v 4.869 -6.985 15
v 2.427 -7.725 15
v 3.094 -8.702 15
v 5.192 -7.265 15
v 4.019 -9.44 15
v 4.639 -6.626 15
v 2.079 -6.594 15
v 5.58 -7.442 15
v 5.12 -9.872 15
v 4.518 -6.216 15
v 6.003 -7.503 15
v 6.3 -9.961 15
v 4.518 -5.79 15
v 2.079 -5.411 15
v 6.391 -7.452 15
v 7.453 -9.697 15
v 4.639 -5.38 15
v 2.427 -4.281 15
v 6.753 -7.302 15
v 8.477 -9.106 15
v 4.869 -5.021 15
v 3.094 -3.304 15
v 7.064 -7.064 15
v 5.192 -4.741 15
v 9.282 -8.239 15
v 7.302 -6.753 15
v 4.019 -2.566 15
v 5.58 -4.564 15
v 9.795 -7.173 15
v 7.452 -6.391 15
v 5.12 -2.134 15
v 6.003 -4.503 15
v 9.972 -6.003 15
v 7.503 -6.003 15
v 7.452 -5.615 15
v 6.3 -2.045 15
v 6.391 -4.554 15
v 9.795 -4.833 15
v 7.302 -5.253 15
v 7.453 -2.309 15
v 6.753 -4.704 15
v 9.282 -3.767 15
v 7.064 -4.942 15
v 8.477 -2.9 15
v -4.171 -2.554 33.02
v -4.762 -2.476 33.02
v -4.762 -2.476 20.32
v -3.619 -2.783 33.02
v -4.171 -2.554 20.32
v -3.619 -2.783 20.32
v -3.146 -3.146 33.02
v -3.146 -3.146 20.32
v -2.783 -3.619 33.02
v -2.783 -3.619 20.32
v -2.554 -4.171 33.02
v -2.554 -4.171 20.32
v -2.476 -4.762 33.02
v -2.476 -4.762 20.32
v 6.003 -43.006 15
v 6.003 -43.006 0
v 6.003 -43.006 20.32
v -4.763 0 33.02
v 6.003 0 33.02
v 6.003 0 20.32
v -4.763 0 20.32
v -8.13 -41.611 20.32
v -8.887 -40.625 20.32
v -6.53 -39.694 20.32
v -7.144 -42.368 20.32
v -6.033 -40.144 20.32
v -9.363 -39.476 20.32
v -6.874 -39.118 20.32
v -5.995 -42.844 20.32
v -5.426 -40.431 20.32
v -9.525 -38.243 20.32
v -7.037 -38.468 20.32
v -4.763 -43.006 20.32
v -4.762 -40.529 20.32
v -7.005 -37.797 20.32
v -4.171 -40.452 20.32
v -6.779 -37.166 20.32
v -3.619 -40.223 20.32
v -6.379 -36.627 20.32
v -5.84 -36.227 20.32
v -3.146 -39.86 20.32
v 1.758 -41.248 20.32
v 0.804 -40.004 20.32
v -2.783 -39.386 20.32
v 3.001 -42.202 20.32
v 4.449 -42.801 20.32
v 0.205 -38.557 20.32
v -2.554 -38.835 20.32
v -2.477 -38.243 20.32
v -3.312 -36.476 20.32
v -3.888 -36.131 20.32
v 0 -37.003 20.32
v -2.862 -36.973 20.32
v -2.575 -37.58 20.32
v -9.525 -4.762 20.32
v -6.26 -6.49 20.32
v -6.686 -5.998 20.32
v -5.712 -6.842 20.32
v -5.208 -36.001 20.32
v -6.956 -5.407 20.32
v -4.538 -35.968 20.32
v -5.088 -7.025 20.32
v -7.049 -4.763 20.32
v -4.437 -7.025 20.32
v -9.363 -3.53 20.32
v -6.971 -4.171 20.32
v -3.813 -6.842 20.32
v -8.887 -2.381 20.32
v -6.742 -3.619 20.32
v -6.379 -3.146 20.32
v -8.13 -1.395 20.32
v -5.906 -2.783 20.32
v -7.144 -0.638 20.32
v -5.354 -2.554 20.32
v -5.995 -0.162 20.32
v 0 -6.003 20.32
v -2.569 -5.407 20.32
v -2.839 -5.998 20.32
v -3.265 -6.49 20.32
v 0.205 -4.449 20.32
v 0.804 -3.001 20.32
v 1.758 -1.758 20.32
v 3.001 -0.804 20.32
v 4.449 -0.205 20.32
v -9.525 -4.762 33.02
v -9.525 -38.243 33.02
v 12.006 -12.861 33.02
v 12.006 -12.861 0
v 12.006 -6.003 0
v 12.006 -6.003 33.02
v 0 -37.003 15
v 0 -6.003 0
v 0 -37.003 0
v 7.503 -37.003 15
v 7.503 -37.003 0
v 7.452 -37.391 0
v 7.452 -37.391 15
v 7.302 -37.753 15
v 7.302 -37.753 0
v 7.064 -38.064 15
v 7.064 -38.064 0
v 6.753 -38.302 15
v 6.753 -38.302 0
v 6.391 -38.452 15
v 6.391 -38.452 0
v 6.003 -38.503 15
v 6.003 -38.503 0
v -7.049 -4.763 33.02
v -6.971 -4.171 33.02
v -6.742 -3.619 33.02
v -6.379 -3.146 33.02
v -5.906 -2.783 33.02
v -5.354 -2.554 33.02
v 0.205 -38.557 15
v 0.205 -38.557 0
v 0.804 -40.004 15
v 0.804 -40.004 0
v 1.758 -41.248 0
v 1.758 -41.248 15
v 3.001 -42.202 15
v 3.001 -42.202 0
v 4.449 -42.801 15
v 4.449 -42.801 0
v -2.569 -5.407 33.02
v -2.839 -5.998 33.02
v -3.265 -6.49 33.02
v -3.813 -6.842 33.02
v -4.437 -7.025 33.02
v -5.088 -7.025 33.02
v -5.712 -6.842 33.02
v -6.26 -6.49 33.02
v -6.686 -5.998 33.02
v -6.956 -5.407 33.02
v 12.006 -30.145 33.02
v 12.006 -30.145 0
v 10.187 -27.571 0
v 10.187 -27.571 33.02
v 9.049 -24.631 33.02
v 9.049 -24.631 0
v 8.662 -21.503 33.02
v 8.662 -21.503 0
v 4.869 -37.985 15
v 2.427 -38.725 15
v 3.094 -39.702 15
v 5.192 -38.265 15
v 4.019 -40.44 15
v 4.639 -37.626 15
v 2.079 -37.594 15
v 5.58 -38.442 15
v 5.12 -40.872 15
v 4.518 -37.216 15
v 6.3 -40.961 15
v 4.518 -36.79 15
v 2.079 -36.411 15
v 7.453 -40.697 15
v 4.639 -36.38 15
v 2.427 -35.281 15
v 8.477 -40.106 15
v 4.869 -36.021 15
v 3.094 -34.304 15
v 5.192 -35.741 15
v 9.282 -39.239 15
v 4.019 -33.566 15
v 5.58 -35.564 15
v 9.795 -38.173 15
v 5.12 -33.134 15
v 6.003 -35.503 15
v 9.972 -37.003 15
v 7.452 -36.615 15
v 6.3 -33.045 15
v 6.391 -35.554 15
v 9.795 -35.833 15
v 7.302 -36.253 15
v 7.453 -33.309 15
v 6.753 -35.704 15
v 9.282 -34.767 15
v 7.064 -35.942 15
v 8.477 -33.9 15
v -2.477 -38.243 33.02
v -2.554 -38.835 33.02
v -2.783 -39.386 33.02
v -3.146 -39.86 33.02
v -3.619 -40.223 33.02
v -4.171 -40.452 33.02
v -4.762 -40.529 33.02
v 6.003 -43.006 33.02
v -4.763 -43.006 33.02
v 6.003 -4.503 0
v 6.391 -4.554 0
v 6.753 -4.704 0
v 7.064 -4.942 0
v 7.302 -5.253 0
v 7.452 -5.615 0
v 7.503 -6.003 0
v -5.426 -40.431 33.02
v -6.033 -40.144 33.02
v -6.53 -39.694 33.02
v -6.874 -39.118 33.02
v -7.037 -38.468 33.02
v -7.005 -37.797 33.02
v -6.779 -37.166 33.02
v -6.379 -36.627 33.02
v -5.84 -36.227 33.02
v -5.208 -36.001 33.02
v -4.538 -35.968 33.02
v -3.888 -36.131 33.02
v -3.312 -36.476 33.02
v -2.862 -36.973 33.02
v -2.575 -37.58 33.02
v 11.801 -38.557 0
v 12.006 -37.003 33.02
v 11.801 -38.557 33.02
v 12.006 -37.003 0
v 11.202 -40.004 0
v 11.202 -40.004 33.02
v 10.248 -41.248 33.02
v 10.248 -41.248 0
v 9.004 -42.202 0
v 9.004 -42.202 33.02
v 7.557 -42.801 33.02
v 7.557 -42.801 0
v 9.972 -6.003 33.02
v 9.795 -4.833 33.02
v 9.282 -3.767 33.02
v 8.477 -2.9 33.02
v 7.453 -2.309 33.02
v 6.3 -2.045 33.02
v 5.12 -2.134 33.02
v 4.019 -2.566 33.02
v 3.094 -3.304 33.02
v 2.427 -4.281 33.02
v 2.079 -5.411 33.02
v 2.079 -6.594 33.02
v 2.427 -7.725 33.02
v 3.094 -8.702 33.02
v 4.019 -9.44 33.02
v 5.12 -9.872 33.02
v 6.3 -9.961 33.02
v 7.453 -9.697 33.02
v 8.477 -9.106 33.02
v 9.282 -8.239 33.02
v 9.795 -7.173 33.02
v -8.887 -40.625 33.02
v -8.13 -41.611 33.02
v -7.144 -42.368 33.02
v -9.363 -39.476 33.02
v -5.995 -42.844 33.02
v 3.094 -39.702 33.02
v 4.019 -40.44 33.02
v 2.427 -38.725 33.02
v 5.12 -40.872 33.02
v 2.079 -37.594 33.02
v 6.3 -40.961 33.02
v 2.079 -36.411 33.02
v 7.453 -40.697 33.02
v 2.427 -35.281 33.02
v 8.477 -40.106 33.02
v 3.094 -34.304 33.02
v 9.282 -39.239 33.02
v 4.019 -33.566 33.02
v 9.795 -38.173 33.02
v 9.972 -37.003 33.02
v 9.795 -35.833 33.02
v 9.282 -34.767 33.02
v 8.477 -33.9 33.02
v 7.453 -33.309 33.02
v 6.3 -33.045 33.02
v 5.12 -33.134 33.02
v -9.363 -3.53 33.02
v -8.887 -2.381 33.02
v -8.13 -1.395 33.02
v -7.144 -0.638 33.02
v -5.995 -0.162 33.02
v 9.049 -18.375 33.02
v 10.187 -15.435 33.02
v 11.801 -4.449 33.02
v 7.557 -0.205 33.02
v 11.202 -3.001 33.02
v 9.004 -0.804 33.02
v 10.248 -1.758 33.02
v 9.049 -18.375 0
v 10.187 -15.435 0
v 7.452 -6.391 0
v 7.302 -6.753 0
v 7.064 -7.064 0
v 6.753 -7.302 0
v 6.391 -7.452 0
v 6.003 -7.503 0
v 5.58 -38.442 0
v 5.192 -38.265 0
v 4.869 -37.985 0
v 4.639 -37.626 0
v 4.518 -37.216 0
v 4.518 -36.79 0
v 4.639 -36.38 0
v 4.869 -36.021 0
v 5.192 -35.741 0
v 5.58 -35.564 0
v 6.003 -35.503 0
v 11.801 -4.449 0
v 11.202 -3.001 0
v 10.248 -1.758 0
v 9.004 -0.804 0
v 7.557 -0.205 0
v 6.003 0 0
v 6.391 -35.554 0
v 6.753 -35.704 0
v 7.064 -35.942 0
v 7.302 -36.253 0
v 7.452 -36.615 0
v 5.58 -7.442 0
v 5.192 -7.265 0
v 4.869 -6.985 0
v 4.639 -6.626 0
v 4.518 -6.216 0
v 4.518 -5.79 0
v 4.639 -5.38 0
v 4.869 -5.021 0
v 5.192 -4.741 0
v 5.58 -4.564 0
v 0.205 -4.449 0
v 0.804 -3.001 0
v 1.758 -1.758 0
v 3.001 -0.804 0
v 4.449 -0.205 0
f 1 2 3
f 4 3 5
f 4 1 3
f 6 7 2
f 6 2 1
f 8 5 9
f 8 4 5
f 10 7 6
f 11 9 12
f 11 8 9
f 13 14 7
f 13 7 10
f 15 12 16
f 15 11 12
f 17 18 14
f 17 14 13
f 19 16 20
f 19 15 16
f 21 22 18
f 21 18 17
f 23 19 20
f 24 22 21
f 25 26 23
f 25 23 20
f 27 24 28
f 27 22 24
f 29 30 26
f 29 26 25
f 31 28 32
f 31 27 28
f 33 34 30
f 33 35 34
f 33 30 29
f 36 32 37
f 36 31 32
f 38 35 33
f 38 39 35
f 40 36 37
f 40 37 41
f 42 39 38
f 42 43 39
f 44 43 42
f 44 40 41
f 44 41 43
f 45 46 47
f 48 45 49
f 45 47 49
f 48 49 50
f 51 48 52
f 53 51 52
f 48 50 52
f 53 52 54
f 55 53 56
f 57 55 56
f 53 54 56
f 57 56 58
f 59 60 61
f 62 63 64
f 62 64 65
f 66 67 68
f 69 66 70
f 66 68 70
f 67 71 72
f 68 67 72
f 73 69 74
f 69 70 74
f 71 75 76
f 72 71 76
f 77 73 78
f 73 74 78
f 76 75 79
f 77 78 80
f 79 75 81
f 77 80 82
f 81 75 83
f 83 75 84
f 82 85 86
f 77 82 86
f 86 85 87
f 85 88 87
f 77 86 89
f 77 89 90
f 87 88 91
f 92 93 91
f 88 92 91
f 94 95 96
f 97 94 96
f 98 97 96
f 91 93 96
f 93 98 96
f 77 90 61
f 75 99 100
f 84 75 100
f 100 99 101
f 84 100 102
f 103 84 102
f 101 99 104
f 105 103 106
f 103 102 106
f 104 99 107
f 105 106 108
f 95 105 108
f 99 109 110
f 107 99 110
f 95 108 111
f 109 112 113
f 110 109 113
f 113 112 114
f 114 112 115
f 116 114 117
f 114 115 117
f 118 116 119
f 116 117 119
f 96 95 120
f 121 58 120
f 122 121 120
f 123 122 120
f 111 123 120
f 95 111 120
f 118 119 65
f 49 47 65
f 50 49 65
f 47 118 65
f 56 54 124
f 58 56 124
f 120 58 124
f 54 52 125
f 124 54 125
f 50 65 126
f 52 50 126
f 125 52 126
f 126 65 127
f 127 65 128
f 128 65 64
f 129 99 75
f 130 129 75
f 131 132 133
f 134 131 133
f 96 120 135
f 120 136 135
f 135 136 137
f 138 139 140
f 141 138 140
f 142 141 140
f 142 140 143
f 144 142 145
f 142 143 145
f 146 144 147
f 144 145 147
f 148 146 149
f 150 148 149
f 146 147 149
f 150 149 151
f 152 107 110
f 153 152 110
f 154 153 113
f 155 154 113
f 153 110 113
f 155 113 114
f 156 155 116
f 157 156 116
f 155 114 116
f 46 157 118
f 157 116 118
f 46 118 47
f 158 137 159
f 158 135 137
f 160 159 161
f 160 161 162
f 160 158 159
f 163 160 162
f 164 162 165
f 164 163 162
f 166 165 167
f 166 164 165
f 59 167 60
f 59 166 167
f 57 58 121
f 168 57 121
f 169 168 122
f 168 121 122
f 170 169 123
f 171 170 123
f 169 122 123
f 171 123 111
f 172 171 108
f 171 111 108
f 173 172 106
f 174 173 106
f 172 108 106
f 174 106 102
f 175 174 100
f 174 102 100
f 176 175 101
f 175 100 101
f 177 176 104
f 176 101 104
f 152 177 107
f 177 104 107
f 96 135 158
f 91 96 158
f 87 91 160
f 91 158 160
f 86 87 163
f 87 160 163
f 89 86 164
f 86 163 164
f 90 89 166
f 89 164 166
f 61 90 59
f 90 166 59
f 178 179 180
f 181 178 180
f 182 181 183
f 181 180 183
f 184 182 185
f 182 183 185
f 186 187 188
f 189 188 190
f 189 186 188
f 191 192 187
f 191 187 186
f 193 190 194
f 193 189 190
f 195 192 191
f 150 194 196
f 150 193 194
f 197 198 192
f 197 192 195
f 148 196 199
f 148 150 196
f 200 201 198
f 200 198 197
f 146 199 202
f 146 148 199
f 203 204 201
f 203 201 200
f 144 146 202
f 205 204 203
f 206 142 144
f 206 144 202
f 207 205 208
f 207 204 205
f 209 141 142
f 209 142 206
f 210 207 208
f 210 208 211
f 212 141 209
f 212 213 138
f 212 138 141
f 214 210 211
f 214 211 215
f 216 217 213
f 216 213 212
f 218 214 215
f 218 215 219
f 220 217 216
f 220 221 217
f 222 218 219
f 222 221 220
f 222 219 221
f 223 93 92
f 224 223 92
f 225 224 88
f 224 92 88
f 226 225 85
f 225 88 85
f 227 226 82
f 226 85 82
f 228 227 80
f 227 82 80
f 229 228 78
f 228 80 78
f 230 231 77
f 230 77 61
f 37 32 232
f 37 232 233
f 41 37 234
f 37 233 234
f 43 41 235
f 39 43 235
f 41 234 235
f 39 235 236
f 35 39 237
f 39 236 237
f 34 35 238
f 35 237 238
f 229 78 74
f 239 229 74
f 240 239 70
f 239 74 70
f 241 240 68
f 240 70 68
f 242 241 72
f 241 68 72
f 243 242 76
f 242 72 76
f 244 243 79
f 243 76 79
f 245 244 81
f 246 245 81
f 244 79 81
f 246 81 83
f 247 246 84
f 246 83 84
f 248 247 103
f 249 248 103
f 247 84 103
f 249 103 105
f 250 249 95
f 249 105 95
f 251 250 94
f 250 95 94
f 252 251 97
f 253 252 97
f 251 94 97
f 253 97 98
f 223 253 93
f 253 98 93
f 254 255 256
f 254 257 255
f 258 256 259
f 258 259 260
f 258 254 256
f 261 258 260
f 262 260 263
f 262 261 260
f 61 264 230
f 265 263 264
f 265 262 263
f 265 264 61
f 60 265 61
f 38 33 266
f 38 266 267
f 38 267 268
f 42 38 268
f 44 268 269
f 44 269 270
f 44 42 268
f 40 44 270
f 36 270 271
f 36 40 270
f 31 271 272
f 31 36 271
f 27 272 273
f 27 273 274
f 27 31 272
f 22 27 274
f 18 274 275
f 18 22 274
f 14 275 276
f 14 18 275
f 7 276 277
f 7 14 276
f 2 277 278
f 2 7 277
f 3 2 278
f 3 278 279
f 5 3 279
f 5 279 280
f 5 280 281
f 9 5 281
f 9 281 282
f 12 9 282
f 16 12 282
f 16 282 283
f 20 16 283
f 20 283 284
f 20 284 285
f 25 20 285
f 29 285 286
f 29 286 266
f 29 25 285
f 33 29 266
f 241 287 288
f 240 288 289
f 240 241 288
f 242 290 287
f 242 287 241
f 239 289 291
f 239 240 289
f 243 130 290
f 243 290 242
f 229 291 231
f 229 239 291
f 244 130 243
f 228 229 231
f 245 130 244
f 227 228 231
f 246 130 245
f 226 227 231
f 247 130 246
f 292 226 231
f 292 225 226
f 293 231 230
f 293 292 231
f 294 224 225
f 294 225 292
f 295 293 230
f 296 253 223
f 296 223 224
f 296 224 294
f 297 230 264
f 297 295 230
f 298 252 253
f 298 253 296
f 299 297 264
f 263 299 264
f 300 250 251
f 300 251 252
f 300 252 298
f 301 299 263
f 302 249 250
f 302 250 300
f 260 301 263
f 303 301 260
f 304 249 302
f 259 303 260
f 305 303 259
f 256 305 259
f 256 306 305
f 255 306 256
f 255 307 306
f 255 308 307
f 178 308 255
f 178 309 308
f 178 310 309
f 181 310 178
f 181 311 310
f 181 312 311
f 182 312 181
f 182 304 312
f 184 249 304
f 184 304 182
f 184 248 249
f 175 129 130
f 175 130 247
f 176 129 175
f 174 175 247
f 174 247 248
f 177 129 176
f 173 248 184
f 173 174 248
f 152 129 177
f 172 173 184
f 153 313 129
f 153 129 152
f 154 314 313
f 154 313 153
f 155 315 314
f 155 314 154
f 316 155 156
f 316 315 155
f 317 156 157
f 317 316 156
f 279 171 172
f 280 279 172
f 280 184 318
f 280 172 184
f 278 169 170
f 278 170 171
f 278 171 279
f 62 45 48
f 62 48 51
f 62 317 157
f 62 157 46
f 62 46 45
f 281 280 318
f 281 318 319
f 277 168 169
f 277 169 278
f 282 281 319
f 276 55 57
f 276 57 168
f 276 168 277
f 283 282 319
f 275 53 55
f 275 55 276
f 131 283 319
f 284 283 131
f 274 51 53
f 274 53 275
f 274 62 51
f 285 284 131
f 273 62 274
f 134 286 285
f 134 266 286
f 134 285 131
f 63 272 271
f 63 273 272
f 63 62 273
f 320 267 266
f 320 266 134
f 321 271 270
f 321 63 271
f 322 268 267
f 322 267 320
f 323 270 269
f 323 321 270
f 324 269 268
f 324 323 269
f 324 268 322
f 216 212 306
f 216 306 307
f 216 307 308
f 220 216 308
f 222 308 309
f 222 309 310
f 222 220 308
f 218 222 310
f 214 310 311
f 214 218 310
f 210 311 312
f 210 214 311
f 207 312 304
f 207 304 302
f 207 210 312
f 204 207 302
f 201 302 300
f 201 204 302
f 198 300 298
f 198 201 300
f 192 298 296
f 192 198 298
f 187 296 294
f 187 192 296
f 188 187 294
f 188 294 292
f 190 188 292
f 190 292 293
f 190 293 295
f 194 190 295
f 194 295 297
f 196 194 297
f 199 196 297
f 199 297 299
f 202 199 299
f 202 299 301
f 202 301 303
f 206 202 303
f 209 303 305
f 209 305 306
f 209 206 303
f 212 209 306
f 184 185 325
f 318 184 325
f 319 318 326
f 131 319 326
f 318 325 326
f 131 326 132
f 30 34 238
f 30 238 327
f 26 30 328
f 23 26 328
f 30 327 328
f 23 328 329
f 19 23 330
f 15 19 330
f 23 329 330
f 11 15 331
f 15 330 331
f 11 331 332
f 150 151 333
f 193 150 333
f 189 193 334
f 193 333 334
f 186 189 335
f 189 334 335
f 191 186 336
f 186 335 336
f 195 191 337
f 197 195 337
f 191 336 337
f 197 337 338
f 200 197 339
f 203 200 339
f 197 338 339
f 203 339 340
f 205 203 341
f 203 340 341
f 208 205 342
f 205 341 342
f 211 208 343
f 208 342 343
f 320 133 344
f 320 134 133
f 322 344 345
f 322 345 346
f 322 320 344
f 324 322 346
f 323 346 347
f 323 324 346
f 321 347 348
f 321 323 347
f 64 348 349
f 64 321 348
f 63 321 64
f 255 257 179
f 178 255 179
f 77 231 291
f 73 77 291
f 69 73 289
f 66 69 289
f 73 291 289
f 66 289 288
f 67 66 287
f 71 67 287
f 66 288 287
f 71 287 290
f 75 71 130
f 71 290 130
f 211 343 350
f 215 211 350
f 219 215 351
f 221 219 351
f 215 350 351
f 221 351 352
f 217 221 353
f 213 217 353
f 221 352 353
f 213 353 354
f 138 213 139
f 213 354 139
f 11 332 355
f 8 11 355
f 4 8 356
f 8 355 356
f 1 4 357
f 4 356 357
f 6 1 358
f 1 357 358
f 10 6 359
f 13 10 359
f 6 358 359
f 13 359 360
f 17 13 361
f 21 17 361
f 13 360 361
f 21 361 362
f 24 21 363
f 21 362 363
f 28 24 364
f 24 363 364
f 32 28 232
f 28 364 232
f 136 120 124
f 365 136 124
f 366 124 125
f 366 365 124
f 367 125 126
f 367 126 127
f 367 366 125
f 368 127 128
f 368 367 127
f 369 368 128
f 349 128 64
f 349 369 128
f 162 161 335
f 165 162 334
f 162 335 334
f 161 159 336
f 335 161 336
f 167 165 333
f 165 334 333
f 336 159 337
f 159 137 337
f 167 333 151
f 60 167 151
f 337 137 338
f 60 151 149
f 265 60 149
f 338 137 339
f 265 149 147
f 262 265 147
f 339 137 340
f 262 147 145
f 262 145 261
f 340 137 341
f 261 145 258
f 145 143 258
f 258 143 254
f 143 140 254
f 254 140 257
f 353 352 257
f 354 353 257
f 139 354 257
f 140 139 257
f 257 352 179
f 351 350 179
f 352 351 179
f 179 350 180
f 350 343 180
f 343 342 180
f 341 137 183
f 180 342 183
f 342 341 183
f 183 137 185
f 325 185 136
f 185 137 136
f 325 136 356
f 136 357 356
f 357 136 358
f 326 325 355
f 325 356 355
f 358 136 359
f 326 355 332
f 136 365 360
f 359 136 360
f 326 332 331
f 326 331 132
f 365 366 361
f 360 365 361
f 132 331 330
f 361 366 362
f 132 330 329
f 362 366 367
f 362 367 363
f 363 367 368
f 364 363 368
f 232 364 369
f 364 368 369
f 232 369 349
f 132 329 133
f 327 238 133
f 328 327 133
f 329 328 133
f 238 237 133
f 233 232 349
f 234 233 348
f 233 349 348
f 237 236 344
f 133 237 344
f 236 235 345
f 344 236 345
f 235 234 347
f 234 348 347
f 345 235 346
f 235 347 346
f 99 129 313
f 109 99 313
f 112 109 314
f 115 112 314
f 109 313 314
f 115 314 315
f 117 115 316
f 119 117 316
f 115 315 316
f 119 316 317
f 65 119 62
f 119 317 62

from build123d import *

# Parameters (mm, degrees)
F1_DEPTH = 15
F2_R     = 3.96875
F3_DEPTH = 18.02
F4_R     = 6.002975
F5_R     = 4.7625
F7_DEPTH = 33.02
F8_DEPTH = 5.32


# Not quite as in the source:
# - a fillet or chamfer is up to 0.001 mm smaller than in the source, because OpenCascade refuses the exact size


with BuildPart() as f1:
    # F0 (on Top) → F1 (new body)
    with BuildSketch(Plane.XY):
        Polygon((6.0029852, 0), (0, 0), (0, -43.0059592), (6.0029852, -43.0059592), (12.0059704, -43.0059592), (12.0059704, 0), align=None)
        with BuildLine():
            ThreePointArc((7.5029852, -37.002974), (7.0636453718, -38.0636341718), (6.0029852, -38.502974))
            ThreePointArc((6.0029852, -38.502974), (4.5029852, -37.002974), (6.0029852, -35.502974))
            ThreePointArc((6.0029852, -35.502974), (7.0636453718, -35.9423138282), (7.5029852, -37.002974))
        make_face(mode=Mode.SUBTRACT)
        with BuildLine():
            ThreePointArc((6.0029852, -7.5029852), (4.5029852, -6.0029852), (6.0029852, -4.5029852))
            ThreePointArc((6.0029852, -4.5029852), (7.0636453718, -4.9423250282), (7.5029852, -6.0029852))
            ThreePointArc((7.5029852, -6.0029852), (7.0636453718, -7.0636453718), (6.0029852, -7.5029852))
        make_face(mode=Mode.SUBTRACT)
    extrude(amount=F1_DEPTH)

    # F2 (on face) → F3 (join)
    with BuildSketch(Plane.XY.offset(15)):
        with BuildLine():
            Line((12.0059704, -43.0059592), (12.0059704, 0))
            Line((12.0059704, 0), (-4.7625, 0))
            Line((-4.7625, 0), (-4.7625, -2.4765))
            ThreePointArc((-4.7625, -2.4765), (-3.1460538982, -3.1460538982), (-2.4765, -4.7625))
            ThreePointArc((-2.4765, -4.7625), (-4.7625, -7.0485), (-7.0485, -4.7625))
            Line((-7.0485, -4.7625), (-9.525, -4.7625))
            Line((-9.525, -4.7625), (-9.525, -43.0059592))
            Line((-9.525, -43.0059592), (-4.7625, -43.0059592))
            Line((-4.7625, -43.0059592), (12.0059704, -43.0059592))
        make_face()
        with BuildLine():
            ThreePointArc((-2.4765, -38.2434592), (-3.1460538982, -39.8599053018), (-4.7625, -40.5294592))
            ThreePointArc((-4.7625, -40.5294592), (-6.3789461018, -36.6270130982), (-2.4765, -38.2434592))
        make_face(mode=Mode.SUBTRACT)
        with Locations((6.0029852, -37.002974)):
            Circle(F2_R, mode=Mode.SUBTRACT)
        with Locations((6.0029852, -6.0029852)):
            Circle(F2_R, mode=Mode.SUBTRACT)
        with BuildLine():
            Line((-4.7625, -2.4765), (-4.7625, 0))
            Line((-4.7625, 0), (-9.525, 0))
            Line((-9.525, 0), (-9.525, -4.7625))
            Line((-9.525, -4.7625), (-7.0485, -4.7625))
            ThreePointArc((-7.0485, -4.7625), (-6.3789461018, -3.1460538982), (-4.7625, -2.4765))
        make_face()
    extrude(amount=F3_DEPTH)

    # F4 (radius 6.0029852 in the source; OpenCascade refuses exactly that, so slightly less here)
    f4_edges = [f1.edges().sort_by_distance(p)[0] for p in [
        (12.00597, 0, 16.51),
        (0, 0, 7.5),
        (0, -43.005959, 7.5),
        (12.00597, -43.005959, 16.51),
    ]]
    fillet(f4_edges, radius=F4_R)

    # F5
    f5_edges = [f1.edges().sort_by_distance(p)[0] for p in [
        (-9.525, -43.005959, 24.01),
        (-9.525, 0, 24.01),
    ]]
    fillet(f5_edges, radius=F5_R)

    # F6 (on face) → F7 (cut, through all)
    with BuildSketch(Plane(origin=(0, 0, 0), x_dir=(1, 0, 0), z_dir=(0, 0, -1))):
        with BuildLine():
            ThreePointArc((12.0059704, 30.145029001), (9.5274974569, 26.1361174223), (8.6624922, 21.5029796))
            Line((8.6624922, 21.5029796), (12.0059704, 21.5029796))
            Line((12.0059704, 21.5029796), (12.0059704, 30.145029001))
        make_face()
        with BuildLine():
            Line((12.0059704, 21.5029796), (8.6624922, 21.5029796))
            ThreePointArc((8.6624922, 21.5029796), (9.5274974569, 16.8698417777), (12.0059704, 12.860930199))
            Line((12.0059704, 12.860930199), (12.0059704, 21.5029796))
        make_face()
    extrude(amount=-F7_DEPTH, mode=Mode.SUBTRACT)

    # F8 (cut): a face of the model
    f8_faces = [f1.faces().sort_by_distance(p)[0] for p in [
        (-4.4215962699, -21.5029796, 15),
    ]]
    extrude(f8_faces, amount=-F8_DEPTH, mode=Mode.SUBTRACT)


solid = f1.part
